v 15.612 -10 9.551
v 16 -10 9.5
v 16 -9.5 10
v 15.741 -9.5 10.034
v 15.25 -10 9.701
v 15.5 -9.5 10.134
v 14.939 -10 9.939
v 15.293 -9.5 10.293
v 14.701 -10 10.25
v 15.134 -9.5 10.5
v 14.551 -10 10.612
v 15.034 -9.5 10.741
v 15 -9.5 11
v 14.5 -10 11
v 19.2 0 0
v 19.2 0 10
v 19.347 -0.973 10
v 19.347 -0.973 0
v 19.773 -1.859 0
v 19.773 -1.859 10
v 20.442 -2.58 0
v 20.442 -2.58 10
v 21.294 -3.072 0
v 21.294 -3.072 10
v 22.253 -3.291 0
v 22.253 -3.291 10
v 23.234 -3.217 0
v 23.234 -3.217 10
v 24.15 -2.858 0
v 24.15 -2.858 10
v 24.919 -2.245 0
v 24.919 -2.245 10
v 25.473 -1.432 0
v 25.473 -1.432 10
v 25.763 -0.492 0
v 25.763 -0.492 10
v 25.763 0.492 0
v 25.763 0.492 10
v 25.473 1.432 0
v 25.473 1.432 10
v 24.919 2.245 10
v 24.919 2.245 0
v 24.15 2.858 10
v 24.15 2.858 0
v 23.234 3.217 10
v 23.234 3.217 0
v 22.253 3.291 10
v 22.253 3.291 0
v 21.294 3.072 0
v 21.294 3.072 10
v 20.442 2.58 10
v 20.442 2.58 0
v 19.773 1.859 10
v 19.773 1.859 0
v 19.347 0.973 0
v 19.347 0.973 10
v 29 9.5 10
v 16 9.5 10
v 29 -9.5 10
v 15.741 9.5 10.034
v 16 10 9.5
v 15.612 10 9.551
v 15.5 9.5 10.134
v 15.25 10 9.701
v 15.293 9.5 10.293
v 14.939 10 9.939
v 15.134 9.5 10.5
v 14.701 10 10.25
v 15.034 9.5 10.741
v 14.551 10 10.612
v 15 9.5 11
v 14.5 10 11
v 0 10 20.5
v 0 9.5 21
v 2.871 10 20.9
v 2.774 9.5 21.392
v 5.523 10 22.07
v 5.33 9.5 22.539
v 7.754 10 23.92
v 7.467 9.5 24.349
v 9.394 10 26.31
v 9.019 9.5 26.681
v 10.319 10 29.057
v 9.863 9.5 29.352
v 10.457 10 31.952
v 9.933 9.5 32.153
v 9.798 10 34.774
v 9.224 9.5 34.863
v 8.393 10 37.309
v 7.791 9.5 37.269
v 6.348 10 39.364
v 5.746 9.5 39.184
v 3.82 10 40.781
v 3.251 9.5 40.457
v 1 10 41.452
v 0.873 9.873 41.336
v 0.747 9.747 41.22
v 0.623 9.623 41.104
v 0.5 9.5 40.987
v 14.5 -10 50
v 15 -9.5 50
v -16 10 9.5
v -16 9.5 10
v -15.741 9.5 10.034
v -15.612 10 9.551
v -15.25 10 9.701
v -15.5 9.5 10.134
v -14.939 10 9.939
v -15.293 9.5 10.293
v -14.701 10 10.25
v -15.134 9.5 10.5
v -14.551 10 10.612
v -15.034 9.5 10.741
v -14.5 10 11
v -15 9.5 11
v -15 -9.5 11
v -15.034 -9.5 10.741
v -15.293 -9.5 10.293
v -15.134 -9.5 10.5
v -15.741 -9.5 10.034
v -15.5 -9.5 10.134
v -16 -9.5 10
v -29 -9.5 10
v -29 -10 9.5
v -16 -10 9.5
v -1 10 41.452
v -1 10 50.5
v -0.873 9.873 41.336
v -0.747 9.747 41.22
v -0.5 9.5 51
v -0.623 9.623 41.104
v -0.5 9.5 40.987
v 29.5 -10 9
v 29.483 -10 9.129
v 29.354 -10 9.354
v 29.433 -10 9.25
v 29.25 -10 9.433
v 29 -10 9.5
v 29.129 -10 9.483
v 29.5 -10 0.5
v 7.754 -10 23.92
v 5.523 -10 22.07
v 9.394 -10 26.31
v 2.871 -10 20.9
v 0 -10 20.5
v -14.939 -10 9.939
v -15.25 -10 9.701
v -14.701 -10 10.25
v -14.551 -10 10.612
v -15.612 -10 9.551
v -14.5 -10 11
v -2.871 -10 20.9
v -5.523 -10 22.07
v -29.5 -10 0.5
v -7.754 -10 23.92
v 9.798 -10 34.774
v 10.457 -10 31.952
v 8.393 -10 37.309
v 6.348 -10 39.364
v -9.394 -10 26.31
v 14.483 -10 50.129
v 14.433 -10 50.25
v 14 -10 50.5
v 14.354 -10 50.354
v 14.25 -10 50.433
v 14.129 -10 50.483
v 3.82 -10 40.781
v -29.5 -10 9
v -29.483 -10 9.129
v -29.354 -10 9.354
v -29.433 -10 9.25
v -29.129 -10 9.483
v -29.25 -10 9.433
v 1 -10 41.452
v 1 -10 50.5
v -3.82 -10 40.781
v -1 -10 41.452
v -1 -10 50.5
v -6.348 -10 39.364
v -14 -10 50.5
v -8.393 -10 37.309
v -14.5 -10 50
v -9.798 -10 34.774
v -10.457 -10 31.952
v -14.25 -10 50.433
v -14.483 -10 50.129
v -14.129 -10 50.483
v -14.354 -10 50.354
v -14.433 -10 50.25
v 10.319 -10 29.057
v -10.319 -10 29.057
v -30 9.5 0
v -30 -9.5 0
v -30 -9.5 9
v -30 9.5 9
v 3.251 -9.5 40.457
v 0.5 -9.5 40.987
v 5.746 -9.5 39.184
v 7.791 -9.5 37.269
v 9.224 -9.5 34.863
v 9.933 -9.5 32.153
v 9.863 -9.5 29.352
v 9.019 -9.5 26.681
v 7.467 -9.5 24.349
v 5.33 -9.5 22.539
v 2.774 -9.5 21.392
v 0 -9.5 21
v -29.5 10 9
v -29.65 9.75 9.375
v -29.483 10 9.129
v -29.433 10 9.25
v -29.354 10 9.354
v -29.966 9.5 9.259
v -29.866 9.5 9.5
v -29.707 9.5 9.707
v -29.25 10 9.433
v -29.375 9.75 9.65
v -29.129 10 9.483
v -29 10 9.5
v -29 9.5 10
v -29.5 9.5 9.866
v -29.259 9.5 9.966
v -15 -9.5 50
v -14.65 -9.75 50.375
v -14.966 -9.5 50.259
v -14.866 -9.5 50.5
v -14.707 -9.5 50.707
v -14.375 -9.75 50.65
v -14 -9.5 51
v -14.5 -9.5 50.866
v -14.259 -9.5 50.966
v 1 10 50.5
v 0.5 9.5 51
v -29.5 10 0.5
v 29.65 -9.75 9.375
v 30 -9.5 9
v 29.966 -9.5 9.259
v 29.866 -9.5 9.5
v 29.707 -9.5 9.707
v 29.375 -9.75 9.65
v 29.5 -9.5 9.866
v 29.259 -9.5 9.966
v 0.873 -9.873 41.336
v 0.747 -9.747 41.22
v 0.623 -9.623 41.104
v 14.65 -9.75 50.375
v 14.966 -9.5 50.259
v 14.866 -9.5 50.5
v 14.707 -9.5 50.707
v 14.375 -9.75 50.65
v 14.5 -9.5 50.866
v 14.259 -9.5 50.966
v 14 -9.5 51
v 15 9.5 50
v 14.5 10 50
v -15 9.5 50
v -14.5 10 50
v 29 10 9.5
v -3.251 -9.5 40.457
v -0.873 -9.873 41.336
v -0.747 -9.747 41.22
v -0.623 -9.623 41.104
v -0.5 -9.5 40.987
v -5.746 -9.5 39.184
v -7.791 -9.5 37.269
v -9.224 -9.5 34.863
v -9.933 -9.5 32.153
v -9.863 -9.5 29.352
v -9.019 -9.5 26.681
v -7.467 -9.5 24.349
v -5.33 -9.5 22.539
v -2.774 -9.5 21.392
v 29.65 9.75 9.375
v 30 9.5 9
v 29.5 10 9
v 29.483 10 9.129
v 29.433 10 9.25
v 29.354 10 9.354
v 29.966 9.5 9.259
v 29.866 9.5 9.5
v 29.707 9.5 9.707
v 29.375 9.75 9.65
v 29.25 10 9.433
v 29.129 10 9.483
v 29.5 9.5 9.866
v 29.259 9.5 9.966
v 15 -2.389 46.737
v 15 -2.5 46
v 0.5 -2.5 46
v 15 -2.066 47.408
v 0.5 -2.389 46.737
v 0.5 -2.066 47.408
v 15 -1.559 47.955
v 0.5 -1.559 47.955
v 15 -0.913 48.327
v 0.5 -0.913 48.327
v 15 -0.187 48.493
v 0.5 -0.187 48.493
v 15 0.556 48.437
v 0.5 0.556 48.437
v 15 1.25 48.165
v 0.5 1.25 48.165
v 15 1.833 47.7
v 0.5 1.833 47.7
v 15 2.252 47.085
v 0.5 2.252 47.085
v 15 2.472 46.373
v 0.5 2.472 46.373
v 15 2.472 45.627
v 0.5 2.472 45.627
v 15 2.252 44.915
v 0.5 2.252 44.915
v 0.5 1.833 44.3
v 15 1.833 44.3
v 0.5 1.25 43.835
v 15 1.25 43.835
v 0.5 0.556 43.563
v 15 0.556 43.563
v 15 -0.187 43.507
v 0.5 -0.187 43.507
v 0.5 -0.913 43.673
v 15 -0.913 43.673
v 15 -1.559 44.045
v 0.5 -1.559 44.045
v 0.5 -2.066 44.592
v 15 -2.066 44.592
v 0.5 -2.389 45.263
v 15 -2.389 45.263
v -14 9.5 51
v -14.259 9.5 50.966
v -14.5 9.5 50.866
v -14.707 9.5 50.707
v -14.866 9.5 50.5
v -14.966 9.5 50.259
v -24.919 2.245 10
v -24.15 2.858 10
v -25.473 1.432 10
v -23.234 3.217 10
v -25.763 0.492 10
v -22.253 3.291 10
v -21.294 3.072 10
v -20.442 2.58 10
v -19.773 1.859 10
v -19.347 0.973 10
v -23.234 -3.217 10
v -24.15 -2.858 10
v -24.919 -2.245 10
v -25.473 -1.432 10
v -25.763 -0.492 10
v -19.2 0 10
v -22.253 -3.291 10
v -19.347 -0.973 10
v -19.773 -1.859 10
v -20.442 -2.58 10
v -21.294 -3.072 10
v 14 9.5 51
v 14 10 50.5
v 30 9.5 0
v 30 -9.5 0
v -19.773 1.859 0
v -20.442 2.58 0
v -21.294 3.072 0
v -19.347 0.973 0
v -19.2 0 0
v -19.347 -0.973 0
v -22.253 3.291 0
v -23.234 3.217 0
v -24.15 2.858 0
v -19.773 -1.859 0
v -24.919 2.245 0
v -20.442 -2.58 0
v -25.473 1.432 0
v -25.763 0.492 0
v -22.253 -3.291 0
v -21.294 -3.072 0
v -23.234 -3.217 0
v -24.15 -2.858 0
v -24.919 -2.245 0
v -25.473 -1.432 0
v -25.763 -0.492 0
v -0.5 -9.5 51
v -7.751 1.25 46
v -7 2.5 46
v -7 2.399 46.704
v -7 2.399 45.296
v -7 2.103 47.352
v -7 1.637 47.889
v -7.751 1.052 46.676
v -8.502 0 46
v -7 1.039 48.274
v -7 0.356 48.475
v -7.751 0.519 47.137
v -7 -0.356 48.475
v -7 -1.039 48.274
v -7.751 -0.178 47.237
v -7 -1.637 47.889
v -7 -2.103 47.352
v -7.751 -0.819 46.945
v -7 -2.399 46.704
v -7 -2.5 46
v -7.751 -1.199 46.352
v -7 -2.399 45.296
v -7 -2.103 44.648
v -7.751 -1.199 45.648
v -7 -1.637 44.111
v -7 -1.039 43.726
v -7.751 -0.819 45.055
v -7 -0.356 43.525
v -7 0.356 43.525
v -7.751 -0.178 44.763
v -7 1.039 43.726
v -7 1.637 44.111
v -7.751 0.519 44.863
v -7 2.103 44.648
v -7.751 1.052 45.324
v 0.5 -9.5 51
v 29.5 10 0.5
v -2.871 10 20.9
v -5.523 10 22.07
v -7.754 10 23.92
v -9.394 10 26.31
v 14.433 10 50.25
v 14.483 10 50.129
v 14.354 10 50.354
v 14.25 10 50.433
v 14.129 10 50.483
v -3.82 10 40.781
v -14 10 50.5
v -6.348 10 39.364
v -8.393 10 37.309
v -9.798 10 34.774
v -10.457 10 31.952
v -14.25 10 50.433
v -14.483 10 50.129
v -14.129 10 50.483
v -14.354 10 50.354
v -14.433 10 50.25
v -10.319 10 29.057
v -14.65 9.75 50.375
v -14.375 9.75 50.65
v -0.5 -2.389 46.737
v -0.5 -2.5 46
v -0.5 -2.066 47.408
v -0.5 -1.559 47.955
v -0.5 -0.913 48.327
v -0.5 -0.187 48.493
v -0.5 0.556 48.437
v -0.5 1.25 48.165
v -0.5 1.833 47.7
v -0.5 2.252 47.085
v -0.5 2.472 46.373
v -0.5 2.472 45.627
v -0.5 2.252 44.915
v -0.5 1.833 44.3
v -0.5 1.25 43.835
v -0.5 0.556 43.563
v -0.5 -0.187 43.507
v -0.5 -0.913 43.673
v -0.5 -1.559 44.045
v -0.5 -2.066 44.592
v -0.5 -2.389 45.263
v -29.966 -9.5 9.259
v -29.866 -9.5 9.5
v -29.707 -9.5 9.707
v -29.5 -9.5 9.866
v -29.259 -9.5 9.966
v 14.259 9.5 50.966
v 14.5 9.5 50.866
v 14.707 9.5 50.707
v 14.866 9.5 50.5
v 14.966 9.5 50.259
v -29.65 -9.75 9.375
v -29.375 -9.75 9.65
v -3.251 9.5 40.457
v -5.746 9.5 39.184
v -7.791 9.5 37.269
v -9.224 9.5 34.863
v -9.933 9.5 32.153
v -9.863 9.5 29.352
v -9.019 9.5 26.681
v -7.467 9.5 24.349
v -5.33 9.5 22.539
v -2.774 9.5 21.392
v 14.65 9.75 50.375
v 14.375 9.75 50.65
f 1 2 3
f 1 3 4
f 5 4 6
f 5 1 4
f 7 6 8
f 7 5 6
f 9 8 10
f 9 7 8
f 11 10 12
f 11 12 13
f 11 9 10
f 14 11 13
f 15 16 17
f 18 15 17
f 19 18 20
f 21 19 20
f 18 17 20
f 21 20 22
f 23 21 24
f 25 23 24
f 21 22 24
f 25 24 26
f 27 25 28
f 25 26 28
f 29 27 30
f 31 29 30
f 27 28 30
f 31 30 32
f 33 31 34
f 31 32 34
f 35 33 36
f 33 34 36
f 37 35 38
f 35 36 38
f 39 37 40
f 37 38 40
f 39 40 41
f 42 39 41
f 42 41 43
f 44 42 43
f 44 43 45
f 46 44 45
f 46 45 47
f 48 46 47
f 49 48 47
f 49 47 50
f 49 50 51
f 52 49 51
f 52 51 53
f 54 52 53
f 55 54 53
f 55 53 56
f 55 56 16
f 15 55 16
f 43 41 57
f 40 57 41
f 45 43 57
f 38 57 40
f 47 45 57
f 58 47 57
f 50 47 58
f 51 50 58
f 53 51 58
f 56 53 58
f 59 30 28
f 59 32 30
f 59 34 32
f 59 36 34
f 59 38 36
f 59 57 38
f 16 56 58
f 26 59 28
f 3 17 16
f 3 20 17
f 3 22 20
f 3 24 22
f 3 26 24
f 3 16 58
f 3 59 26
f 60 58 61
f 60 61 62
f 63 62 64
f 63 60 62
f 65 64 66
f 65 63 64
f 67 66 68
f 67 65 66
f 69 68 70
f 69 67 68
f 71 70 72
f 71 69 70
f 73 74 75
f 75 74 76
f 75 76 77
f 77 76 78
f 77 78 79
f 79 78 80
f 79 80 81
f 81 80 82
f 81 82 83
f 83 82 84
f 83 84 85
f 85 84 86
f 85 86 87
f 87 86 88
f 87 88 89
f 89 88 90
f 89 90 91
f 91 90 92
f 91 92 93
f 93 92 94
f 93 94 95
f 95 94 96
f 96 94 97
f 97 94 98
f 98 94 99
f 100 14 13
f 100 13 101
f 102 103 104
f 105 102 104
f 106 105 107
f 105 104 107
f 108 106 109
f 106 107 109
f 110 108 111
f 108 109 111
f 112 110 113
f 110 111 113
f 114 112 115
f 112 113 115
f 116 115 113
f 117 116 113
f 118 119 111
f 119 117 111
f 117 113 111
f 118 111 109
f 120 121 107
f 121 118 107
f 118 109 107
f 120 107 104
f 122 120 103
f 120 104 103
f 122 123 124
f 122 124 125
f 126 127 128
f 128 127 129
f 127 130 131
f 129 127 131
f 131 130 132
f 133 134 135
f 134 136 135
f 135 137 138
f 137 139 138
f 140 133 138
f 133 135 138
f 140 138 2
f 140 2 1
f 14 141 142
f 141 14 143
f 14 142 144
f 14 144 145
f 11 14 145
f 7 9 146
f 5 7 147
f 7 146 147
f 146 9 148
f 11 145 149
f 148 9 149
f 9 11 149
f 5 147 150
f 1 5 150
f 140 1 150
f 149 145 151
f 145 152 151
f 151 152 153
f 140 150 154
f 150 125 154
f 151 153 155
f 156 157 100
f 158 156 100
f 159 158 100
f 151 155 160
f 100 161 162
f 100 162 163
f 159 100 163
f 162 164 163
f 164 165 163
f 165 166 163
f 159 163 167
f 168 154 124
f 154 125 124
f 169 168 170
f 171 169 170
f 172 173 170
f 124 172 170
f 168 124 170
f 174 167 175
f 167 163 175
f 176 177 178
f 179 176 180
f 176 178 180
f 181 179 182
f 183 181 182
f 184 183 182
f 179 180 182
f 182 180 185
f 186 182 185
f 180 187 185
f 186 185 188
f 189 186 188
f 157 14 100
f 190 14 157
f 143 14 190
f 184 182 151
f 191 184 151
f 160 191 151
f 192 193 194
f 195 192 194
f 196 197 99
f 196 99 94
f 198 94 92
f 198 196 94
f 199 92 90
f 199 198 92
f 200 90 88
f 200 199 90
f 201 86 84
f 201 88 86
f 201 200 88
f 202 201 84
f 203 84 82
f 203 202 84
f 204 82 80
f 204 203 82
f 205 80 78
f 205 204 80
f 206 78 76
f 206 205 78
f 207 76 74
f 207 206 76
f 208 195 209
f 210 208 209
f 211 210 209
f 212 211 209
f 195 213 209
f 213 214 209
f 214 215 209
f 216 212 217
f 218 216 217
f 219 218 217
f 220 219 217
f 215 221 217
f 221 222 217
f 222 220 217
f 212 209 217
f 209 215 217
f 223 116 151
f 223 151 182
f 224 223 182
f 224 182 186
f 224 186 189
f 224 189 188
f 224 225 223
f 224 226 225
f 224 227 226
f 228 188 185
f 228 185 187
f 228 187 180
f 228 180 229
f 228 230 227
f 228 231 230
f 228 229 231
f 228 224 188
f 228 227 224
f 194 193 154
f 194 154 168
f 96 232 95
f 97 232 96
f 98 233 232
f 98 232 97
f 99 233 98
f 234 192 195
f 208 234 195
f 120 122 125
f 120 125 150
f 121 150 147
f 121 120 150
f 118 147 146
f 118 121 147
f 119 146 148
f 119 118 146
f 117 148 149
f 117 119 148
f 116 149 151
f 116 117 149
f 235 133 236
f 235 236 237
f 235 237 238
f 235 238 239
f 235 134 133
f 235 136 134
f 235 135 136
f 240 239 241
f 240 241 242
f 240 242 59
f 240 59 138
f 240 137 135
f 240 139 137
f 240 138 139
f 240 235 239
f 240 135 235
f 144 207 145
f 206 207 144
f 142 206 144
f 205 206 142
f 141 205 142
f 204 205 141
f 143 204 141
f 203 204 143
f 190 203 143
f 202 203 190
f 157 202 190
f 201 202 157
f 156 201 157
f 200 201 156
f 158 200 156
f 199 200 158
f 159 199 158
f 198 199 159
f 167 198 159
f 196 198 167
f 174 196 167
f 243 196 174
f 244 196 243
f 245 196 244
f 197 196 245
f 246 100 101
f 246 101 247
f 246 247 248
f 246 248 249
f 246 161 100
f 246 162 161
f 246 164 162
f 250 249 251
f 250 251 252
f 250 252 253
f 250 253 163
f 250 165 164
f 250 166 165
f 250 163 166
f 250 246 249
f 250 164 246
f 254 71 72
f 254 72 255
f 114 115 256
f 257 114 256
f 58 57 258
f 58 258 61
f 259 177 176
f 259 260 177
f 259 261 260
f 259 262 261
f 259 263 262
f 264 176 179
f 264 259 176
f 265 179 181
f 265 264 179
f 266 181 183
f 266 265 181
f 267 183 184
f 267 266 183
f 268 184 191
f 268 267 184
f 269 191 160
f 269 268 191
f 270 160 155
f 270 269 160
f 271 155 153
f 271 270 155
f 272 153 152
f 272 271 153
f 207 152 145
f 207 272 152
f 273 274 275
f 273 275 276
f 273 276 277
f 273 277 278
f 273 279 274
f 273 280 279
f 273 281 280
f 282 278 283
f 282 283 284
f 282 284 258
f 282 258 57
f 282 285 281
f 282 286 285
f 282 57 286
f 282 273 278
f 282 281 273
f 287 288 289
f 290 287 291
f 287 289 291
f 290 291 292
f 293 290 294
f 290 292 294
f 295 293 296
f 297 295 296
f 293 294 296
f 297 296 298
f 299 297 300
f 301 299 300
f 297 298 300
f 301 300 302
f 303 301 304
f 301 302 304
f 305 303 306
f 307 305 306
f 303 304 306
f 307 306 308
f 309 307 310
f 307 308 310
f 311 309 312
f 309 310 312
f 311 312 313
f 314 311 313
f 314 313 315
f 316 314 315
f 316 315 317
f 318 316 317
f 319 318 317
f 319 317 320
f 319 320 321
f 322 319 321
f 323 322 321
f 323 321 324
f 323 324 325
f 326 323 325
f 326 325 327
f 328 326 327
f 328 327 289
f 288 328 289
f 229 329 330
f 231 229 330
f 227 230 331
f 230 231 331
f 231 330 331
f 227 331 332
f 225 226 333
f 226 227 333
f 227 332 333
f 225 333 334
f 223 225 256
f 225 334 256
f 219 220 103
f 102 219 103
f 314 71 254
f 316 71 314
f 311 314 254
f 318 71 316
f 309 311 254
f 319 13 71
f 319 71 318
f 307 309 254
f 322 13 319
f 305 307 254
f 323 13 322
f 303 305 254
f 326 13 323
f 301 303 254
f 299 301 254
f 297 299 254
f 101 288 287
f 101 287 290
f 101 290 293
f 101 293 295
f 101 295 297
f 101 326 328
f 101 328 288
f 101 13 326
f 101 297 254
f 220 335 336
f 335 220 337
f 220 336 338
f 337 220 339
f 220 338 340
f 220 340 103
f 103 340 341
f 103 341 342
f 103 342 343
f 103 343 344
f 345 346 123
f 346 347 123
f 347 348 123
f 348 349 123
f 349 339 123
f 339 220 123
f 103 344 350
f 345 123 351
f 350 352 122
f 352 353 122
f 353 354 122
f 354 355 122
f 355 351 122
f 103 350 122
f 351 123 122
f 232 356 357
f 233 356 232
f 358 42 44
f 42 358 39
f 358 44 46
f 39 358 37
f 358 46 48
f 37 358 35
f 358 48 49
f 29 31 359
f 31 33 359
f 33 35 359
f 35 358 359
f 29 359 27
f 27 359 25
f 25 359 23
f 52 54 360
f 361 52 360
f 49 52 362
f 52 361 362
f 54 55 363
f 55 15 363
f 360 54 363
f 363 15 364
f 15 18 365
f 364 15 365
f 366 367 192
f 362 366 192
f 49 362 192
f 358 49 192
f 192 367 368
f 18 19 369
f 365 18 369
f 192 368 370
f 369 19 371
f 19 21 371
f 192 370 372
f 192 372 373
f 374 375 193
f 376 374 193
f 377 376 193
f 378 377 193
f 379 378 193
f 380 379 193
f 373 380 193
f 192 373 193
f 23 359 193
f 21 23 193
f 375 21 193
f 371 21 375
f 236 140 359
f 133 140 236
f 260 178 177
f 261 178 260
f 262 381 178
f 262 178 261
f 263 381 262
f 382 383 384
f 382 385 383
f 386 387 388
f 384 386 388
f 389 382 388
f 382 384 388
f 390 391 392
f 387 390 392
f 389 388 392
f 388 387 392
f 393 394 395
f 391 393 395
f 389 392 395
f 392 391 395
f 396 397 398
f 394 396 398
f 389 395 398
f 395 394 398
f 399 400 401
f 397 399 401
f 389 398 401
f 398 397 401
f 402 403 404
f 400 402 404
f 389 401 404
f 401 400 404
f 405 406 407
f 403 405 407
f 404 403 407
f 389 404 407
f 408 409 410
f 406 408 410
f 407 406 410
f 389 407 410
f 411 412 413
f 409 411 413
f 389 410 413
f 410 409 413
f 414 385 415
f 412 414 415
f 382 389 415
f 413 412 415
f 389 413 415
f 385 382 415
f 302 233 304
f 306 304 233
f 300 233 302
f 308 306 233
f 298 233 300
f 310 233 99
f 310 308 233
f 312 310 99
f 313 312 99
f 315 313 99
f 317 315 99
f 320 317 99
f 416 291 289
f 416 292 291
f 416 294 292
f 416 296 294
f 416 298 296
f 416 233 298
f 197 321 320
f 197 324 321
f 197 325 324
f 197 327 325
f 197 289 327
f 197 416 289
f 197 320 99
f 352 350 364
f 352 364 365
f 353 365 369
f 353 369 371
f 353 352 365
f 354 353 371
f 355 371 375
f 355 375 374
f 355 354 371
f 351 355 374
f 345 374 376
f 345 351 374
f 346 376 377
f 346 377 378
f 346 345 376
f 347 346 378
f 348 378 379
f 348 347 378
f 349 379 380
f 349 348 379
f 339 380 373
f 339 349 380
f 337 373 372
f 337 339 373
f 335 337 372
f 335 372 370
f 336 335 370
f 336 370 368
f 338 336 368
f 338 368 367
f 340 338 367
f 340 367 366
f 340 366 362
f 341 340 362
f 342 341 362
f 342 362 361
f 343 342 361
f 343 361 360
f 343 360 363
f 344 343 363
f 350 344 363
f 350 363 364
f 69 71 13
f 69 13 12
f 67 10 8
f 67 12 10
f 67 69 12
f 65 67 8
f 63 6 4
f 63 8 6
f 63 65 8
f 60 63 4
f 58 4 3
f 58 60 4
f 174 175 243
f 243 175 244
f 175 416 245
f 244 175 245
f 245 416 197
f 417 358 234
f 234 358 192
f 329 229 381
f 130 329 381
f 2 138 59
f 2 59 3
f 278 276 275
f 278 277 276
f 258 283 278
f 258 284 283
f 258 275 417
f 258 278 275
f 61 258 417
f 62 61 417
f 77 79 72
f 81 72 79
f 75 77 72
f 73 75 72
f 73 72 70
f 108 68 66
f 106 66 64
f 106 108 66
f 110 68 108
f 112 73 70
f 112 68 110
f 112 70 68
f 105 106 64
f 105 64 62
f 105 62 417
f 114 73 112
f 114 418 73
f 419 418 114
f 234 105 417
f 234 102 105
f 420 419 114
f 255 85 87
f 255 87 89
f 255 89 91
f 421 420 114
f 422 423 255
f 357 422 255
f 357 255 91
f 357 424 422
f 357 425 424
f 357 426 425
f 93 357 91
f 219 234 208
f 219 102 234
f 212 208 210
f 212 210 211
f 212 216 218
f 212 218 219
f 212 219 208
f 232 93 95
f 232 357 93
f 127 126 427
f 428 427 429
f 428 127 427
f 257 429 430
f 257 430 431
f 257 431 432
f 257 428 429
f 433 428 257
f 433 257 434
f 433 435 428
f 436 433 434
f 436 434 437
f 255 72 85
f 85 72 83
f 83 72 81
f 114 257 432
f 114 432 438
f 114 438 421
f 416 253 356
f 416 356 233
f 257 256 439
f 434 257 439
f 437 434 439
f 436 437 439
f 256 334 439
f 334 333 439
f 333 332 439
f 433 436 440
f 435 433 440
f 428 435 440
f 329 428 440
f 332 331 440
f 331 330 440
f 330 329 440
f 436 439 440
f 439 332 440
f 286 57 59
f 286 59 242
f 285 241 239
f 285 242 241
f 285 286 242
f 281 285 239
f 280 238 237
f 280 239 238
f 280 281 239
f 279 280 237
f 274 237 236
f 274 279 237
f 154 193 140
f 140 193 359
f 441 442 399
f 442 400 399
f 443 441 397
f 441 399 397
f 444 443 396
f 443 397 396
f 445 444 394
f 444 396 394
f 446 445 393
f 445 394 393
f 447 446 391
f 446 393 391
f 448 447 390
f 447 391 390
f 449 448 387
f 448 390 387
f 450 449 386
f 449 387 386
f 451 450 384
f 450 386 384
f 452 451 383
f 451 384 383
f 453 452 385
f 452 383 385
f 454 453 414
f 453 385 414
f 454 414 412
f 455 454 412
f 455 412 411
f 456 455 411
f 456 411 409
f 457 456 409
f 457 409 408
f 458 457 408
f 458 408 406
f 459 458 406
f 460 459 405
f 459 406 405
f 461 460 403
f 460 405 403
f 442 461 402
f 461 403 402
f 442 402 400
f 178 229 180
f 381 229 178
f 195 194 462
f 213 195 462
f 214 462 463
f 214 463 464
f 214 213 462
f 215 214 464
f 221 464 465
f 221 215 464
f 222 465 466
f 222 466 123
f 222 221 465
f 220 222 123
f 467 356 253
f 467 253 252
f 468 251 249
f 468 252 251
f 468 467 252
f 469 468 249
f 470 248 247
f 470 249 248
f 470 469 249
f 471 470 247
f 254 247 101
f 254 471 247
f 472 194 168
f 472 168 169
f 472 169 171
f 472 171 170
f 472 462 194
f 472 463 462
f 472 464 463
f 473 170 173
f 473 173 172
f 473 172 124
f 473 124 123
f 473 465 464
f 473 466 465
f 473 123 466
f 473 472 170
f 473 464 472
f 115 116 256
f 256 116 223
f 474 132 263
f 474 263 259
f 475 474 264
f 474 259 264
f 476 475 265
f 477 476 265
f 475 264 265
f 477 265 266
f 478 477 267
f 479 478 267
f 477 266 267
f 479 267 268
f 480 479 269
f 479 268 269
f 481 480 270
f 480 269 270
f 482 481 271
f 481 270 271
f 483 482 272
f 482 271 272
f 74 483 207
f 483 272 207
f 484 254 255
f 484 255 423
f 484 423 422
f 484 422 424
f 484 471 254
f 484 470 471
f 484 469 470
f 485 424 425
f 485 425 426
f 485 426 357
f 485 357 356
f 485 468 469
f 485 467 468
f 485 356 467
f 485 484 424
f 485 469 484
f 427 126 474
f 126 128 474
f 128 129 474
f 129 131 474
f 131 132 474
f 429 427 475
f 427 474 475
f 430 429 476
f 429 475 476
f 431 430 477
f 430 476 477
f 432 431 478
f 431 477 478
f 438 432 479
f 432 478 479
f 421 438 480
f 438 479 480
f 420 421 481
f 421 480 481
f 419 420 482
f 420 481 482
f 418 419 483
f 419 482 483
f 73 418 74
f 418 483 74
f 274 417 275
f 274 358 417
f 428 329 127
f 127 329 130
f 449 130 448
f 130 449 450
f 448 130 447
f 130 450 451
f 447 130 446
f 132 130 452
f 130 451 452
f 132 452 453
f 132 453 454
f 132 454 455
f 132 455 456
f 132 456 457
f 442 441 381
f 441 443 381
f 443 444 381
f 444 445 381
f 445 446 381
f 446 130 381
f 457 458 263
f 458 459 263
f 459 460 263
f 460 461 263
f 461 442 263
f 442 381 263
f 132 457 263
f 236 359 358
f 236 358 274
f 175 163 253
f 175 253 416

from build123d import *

# Parameters (mm, degrees)
F1_DEPTH    = 10
F3_D        = 6.6
F6_D        = 5
F6_DEPTH    = 22
F6_TIP      = 1.5021515476
F7_R        = 1
F8_C1_SIZE  = 0.5
F8_C2_SIZE  = 0.5
F8_C3_SIZE  = 0.5
F8_C4_SIZE  = 0.5
F8_C5_SIZE  = 0.5
F8_C6_SIZE  = 0.5
F8_C7_SIZE  = 0.5
F8_C8_SIZE  = 0.5
F8_C9_SIZE  = 0.5
F8_C10_SIZE = 0.5
F8_C11_SIZE = 0.5
F8_C12_SIZE = 0.5


with BuildPart() as f1:
    # F0 (on Front) → F1 (new body, symmetric)
    with BuildSketch(Plane.XZ):
        with BuildLine():
            Line((15, 51), (0.5, 51))
            Line((0.5, 51), (0.5, 40.9874921777))
            ThreePointArc((0.5, 40.9874921777), (9.9968725554, 30.7499217894), (0, 21))
            Line((0, 21), (0, 0))
            Line((0, 0), (30, 0))
            Line((30, 0), (30, 10))
            Line((30, 10), (15, 10))
            Line((15, 10), (15, 51))
        make_face()
    extrude(amount=F1_DEPTH, both=True)

    # F3 (through all)
    with Locations(Plane(origin=(0, 0, 0), x_dir=(1, 0, 0), z_dir=(0, 0, -1))):
        with Locations((22.5, 0)):
            Hole(F3_D / 2)

    # F4: F1 across plane


with BuildPart() as f1_1:
    add(f1.part)
    add(f1.part.mirror(Plane.YZ))

    # F6
    with Locations(Plane.YZ.offset(15)):
        with Locations((0, 46)):
            Hole(F6_D / 2, depth=F6_DEPTH)
            with Locations((0, 0, -(F6_DEPTH + F6_TIP / 2))):  # 118° drill point
                Cone(0, F6_D / 2, F6_TIP, mode=Mode.SUBTRACT)

    # F7
    f7_edges = [f1_1.edges().sort_by_distance(p)[0] for p in [
        (15, 0, 10),
        (-15, 0, 10),
        (-30, 0, 10),
        (30, 0, 10),
        (15, 0, 51),
        (-15, 0, 51),
    ]]
    fillet(f7_edges, radius=F7_R)

    # F8: chamfer of 0.5 on 36 edges, made by hand

    # F8_c1
    f8_c1_edges = [f1_1.edges().sort_by_distance(p)[0] for p in [
        (30, 10, 4.5),
        (29.7071067812, 10, 9.7071067812),
        (22.5, 10, 10),
        (15.2928932188, 10, 10.2928932188),
        (15, 10, 30.5),
        (14.7071067812, 10, 50.7071067812),
        (7.25, 10, 51),
    ]]
    chamfer(f8_c1_edges, length=F8_C1_SIZE)

    # F8_c2
    f8_c2_edges = [f1_1.edges().sort_by_distance(p)[0] for p in [
        (-0.25, 10, 0),
    ]]
    chamfer(f8_c2_edges, length=F8_C2_SIZE)

    # F8_c3
    f8_c3_edges = [f1_1.edges().sort_by_distance(p)[0] for p in [
        (-30, 10, 4.75),
        (-29.7071067812, 10, 9.7071067812),
        (-22.5, 10, 10),
        (-15.2928932188, 10, 10.2928932188),
        (-15, 10, 30.5),
        (-14.7071067812, 10, 50.7071067812),
        (-7.25, 10, 51),
    ]]
    chamfer(f8_c3_edges, length=F8_C3_SIZE)

    # F8_c4
    f8_c4_edges = [f1_1.edges().sort_by_distance(p)[0] for p in [
        (0.5, 10, 45.7437460889),
    ]]
    chamfer(f8_c4_edges, length=F8_C4_SIZE)

    # F8_c5
    f8_c5_edges = [f1_1.edges().sort_by_distance(p)[0] for p in [
        (-0.2507065513, 10, 21.0031431827),
    ]]
    chamfer(f8_c5_edges, length=F8_C5_SIZE)

    # F8_c6
    f8_c6_edges = [f1_1.edges().sort_by_distance(p)[0] for p in [
        (-0.5, 10, 45.9940442409),
    ]]
    chamfer(f8_c6_edges, length=F8_C6_SIZE)

    # F8_c7
    f8_c7_edges = [f1_1.edges().sort_by_distance(p)[0] for p in [
        (30, -10, 4.5),
        (29.7071067812, -10, 9.7071067812),
        (22.5, -10, 10),
        (15.2928932188, -10, 10.2928932188),
        (15, -10, 30.5),
        (14.7071067812, -10, 50.7071067812),
        (7.25, -10, 51),
    ]]
    chamfer(f8_c7_edges, length=F8_C7_SIZE)

    # F8_c8
    f8_c8_edges = [f1_1.edges().sort_by_distance(p)[0] for p in [
        (-0.25, -10, 0),
    ]]
    chamfer(f8_c8_edges, length=F8_C8_SIZE)

    # F8_c9
    f8_c9_edges = [f1_1.edges().sort_by_distance(p)[0] for p in [
        (-30, -10, 4.75),
        (-29.7071067812, -10, 9.7071067812),
        (-22.5, -10, 10),
        (-15.2928932188, -10, 10.2928932188),
        (-15, -10, 30.5),
        (-14.7071067812, -10, 50.7071067812),
        (-7.25, -10, 51),
    ]]
    chamfer(f8_c9_edges, length=F8_C9_SIZE)

    # F8_c10
    f8_c10_edges = [f1_1.edges().sort_by_distance(p)[0] for p in [
        (0.5, -10, 45.7437460889),
    ]]
    chamfer(f8_c10_edges, length=F8_C10_SIZE)

    # F8_c11
    f8_c11_edges = [f1_1.edges().sort_by_distance(p)[0] for p in [
        (-0.2507065513, -10, 21.0031431827),
    ]]
    chamfer(f8_c11_edges, length=F8_C11_SIZE)

    # F8_c12
    f8_c12_edges = [f1_1.edges().sort_by_distance(p)[0] for p in [
        (-0.5, -10, 45.9940442409),
    ]]
    chamfer(f8_c12_edges, length=F8_C12_SIZE)


solid = f1_1.part
